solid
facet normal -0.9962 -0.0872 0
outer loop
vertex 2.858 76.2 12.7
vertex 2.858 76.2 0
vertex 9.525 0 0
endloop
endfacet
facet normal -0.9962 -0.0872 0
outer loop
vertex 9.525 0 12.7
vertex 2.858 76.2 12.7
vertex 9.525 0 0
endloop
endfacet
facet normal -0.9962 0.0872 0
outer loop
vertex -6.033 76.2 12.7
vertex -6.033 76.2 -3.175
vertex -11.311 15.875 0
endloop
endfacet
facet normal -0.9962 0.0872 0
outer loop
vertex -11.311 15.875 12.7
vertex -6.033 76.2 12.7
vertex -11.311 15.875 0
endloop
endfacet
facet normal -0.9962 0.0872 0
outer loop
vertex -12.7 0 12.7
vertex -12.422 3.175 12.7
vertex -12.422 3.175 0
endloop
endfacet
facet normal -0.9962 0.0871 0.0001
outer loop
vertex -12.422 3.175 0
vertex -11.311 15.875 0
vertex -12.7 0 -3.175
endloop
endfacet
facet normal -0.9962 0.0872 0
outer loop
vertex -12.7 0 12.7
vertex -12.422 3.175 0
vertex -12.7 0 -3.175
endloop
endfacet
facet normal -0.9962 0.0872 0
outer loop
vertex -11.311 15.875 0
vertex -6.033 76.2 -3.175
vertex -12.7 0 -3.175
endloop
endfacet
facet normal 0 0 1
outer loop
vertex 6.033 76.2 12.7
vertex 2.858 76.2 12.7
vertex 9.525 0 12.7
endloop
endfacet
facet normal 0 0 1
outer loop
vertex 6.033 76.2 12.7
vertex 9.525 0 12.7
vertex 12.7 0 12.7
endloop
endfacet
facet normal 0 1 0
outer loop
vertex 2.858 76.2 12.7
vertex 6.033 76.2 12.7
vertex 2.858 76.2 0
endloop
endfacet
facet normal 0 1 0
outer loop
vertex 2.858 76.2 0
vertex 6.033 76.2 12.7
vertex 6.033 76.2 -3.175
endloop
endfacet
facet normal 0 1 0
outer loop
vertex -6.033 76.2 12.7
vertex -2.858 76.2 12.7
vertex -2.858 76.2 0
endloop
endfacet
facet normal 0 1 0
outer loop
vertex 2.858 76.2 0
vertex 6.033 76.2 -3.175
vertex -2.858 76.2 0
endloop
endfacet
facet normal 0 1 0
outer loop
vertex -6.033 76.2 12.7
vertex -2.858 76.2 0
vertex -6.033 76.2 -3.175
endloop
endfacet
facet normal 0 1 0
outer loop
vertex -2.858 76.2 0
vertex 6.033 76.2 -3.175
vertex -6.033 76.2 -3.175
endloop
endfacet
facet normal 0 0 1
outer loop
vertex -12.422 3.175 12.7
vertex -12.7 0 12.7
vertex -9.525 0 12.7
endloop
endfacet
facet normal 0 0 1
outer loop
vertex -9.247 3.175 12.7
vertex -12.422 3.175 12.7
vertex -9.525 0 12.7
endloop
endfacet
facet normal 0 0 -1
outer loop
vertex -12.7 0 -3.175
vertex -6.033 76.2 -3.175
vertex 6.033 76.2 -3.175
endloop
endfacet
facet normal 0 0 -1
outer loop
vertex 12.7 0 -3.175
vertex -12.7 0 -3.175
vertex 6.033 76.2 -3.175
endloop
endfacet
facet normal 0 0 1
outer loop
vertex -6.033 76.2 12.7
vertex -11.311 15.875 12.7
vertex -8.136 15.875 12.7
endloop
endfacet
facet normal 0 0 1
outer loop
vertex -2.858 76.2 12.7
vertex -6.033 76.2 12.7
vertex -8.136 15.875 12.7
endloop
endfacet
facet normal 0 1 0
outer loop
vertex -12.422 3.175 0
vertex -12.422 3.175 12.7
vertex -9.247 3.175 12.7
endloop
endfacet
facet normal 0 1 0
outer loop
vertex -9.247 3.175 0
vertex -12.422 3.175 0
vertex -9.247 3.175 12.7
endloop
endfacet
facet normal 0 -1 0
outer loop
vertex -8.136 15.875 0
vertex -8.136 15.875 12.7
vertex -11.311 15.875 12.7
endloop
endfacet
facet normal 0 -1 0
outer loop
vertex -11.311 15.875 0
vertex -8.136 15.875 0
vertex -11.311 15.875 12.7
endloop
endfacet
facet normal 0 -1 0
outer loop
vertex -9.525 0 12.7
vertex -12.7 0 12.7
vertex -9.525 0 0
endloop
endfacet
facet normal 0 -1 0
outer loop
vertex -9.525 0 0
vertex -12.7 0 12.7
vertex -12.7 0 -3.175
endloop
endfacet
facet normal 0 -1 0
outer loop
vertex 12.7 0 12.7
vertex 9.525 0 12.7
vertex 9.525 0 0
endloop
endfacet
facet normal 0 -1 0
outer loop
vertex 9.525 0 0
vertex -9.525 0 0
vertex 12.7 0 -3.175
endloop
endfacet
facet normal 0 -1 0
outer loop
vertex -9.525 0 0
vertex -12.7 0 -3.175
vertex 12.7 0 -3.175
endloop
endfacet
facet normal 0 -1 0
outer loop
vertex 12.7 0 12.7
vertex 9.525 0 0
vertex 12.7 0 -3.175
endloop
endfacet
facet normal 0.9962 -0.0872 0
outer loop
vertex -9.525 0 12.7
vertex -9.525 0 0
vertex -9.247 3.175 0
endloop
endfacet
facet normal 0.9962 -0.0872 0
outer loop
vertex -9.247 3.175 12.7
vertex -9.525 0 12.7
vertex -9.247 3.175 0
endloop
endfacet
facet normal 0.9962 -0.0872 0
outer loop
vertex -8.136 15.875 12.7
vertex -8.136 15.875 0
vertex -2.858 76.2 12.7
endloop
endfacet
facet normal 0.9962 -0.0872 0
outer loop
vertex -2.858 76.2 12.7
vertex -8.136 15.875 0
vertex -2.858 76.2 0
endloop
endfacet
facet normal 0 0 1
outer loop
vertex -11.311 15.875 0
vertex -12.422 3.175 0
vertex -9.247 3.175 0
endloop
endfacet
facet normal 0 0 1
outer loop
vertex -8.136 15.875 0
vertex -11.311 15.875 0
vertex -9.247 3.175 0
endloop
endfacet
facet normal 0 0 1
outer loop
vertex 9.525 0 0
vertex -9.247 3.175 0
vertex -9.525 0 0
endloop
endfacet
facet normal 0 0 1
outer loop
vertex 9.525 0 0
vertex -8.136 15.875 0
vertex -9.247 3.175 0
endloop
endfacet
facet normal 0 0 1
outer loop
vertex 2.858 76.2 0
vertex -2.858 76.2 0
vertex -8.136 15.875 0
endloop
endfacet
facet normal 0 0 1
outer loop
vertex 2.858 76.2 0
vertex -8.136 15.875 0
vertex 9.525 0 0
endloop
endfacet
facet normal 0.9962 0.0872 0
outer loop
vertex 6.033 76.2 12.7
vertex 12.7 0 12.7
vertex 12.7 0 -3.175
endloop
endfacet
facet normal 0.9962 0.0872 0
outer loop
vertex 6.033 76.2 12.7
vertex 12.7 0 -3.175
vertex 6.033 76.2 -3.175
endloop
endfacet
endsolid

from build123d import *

# Parameters (mm, degrees)
F1_DEPTH = 3.175
F3_DEPTH = 12.7
F5_DEPTH = 12.7


with BuildPart() as f1:
    # F0 (on Top) → F1 (new body)
    with BuildSketch(Plane.XY):
        Polygon((-6.0333638393, 76.2), (-12.7, 0), (12.7, 0), (6.0333638393, 76.2), align=None)
    extrude(amount=-F1_DEPTH)

    # F2 (on face) → F3 (join)
    with BuildSketch(Plane.XY):
        Polygon((-2.8583638393, 76.2), (-6.0333638393, 76.2), (-12.7, 0), (-9.525, 0), align=None)
        Polygon((12.7, 0), (6.0333638393, 76.2), (2.8583638393, 76.2), (9.525, 0), align=None)
    extrude(amount=F3_DEPTH)

    # F4 (on face) → F5 (cut, through all)
    with BuildSketch(Plane.XY.offset(12.7)):
        Polygon((0, 15.875), (-11.3111174665, 15.875), (-12.4222234933, 3.175), (0, 3.175), align=None)
    extrude(amount=-F5_DEPTH, mode=Mode.SUBTRACT)


solid = f1.part
